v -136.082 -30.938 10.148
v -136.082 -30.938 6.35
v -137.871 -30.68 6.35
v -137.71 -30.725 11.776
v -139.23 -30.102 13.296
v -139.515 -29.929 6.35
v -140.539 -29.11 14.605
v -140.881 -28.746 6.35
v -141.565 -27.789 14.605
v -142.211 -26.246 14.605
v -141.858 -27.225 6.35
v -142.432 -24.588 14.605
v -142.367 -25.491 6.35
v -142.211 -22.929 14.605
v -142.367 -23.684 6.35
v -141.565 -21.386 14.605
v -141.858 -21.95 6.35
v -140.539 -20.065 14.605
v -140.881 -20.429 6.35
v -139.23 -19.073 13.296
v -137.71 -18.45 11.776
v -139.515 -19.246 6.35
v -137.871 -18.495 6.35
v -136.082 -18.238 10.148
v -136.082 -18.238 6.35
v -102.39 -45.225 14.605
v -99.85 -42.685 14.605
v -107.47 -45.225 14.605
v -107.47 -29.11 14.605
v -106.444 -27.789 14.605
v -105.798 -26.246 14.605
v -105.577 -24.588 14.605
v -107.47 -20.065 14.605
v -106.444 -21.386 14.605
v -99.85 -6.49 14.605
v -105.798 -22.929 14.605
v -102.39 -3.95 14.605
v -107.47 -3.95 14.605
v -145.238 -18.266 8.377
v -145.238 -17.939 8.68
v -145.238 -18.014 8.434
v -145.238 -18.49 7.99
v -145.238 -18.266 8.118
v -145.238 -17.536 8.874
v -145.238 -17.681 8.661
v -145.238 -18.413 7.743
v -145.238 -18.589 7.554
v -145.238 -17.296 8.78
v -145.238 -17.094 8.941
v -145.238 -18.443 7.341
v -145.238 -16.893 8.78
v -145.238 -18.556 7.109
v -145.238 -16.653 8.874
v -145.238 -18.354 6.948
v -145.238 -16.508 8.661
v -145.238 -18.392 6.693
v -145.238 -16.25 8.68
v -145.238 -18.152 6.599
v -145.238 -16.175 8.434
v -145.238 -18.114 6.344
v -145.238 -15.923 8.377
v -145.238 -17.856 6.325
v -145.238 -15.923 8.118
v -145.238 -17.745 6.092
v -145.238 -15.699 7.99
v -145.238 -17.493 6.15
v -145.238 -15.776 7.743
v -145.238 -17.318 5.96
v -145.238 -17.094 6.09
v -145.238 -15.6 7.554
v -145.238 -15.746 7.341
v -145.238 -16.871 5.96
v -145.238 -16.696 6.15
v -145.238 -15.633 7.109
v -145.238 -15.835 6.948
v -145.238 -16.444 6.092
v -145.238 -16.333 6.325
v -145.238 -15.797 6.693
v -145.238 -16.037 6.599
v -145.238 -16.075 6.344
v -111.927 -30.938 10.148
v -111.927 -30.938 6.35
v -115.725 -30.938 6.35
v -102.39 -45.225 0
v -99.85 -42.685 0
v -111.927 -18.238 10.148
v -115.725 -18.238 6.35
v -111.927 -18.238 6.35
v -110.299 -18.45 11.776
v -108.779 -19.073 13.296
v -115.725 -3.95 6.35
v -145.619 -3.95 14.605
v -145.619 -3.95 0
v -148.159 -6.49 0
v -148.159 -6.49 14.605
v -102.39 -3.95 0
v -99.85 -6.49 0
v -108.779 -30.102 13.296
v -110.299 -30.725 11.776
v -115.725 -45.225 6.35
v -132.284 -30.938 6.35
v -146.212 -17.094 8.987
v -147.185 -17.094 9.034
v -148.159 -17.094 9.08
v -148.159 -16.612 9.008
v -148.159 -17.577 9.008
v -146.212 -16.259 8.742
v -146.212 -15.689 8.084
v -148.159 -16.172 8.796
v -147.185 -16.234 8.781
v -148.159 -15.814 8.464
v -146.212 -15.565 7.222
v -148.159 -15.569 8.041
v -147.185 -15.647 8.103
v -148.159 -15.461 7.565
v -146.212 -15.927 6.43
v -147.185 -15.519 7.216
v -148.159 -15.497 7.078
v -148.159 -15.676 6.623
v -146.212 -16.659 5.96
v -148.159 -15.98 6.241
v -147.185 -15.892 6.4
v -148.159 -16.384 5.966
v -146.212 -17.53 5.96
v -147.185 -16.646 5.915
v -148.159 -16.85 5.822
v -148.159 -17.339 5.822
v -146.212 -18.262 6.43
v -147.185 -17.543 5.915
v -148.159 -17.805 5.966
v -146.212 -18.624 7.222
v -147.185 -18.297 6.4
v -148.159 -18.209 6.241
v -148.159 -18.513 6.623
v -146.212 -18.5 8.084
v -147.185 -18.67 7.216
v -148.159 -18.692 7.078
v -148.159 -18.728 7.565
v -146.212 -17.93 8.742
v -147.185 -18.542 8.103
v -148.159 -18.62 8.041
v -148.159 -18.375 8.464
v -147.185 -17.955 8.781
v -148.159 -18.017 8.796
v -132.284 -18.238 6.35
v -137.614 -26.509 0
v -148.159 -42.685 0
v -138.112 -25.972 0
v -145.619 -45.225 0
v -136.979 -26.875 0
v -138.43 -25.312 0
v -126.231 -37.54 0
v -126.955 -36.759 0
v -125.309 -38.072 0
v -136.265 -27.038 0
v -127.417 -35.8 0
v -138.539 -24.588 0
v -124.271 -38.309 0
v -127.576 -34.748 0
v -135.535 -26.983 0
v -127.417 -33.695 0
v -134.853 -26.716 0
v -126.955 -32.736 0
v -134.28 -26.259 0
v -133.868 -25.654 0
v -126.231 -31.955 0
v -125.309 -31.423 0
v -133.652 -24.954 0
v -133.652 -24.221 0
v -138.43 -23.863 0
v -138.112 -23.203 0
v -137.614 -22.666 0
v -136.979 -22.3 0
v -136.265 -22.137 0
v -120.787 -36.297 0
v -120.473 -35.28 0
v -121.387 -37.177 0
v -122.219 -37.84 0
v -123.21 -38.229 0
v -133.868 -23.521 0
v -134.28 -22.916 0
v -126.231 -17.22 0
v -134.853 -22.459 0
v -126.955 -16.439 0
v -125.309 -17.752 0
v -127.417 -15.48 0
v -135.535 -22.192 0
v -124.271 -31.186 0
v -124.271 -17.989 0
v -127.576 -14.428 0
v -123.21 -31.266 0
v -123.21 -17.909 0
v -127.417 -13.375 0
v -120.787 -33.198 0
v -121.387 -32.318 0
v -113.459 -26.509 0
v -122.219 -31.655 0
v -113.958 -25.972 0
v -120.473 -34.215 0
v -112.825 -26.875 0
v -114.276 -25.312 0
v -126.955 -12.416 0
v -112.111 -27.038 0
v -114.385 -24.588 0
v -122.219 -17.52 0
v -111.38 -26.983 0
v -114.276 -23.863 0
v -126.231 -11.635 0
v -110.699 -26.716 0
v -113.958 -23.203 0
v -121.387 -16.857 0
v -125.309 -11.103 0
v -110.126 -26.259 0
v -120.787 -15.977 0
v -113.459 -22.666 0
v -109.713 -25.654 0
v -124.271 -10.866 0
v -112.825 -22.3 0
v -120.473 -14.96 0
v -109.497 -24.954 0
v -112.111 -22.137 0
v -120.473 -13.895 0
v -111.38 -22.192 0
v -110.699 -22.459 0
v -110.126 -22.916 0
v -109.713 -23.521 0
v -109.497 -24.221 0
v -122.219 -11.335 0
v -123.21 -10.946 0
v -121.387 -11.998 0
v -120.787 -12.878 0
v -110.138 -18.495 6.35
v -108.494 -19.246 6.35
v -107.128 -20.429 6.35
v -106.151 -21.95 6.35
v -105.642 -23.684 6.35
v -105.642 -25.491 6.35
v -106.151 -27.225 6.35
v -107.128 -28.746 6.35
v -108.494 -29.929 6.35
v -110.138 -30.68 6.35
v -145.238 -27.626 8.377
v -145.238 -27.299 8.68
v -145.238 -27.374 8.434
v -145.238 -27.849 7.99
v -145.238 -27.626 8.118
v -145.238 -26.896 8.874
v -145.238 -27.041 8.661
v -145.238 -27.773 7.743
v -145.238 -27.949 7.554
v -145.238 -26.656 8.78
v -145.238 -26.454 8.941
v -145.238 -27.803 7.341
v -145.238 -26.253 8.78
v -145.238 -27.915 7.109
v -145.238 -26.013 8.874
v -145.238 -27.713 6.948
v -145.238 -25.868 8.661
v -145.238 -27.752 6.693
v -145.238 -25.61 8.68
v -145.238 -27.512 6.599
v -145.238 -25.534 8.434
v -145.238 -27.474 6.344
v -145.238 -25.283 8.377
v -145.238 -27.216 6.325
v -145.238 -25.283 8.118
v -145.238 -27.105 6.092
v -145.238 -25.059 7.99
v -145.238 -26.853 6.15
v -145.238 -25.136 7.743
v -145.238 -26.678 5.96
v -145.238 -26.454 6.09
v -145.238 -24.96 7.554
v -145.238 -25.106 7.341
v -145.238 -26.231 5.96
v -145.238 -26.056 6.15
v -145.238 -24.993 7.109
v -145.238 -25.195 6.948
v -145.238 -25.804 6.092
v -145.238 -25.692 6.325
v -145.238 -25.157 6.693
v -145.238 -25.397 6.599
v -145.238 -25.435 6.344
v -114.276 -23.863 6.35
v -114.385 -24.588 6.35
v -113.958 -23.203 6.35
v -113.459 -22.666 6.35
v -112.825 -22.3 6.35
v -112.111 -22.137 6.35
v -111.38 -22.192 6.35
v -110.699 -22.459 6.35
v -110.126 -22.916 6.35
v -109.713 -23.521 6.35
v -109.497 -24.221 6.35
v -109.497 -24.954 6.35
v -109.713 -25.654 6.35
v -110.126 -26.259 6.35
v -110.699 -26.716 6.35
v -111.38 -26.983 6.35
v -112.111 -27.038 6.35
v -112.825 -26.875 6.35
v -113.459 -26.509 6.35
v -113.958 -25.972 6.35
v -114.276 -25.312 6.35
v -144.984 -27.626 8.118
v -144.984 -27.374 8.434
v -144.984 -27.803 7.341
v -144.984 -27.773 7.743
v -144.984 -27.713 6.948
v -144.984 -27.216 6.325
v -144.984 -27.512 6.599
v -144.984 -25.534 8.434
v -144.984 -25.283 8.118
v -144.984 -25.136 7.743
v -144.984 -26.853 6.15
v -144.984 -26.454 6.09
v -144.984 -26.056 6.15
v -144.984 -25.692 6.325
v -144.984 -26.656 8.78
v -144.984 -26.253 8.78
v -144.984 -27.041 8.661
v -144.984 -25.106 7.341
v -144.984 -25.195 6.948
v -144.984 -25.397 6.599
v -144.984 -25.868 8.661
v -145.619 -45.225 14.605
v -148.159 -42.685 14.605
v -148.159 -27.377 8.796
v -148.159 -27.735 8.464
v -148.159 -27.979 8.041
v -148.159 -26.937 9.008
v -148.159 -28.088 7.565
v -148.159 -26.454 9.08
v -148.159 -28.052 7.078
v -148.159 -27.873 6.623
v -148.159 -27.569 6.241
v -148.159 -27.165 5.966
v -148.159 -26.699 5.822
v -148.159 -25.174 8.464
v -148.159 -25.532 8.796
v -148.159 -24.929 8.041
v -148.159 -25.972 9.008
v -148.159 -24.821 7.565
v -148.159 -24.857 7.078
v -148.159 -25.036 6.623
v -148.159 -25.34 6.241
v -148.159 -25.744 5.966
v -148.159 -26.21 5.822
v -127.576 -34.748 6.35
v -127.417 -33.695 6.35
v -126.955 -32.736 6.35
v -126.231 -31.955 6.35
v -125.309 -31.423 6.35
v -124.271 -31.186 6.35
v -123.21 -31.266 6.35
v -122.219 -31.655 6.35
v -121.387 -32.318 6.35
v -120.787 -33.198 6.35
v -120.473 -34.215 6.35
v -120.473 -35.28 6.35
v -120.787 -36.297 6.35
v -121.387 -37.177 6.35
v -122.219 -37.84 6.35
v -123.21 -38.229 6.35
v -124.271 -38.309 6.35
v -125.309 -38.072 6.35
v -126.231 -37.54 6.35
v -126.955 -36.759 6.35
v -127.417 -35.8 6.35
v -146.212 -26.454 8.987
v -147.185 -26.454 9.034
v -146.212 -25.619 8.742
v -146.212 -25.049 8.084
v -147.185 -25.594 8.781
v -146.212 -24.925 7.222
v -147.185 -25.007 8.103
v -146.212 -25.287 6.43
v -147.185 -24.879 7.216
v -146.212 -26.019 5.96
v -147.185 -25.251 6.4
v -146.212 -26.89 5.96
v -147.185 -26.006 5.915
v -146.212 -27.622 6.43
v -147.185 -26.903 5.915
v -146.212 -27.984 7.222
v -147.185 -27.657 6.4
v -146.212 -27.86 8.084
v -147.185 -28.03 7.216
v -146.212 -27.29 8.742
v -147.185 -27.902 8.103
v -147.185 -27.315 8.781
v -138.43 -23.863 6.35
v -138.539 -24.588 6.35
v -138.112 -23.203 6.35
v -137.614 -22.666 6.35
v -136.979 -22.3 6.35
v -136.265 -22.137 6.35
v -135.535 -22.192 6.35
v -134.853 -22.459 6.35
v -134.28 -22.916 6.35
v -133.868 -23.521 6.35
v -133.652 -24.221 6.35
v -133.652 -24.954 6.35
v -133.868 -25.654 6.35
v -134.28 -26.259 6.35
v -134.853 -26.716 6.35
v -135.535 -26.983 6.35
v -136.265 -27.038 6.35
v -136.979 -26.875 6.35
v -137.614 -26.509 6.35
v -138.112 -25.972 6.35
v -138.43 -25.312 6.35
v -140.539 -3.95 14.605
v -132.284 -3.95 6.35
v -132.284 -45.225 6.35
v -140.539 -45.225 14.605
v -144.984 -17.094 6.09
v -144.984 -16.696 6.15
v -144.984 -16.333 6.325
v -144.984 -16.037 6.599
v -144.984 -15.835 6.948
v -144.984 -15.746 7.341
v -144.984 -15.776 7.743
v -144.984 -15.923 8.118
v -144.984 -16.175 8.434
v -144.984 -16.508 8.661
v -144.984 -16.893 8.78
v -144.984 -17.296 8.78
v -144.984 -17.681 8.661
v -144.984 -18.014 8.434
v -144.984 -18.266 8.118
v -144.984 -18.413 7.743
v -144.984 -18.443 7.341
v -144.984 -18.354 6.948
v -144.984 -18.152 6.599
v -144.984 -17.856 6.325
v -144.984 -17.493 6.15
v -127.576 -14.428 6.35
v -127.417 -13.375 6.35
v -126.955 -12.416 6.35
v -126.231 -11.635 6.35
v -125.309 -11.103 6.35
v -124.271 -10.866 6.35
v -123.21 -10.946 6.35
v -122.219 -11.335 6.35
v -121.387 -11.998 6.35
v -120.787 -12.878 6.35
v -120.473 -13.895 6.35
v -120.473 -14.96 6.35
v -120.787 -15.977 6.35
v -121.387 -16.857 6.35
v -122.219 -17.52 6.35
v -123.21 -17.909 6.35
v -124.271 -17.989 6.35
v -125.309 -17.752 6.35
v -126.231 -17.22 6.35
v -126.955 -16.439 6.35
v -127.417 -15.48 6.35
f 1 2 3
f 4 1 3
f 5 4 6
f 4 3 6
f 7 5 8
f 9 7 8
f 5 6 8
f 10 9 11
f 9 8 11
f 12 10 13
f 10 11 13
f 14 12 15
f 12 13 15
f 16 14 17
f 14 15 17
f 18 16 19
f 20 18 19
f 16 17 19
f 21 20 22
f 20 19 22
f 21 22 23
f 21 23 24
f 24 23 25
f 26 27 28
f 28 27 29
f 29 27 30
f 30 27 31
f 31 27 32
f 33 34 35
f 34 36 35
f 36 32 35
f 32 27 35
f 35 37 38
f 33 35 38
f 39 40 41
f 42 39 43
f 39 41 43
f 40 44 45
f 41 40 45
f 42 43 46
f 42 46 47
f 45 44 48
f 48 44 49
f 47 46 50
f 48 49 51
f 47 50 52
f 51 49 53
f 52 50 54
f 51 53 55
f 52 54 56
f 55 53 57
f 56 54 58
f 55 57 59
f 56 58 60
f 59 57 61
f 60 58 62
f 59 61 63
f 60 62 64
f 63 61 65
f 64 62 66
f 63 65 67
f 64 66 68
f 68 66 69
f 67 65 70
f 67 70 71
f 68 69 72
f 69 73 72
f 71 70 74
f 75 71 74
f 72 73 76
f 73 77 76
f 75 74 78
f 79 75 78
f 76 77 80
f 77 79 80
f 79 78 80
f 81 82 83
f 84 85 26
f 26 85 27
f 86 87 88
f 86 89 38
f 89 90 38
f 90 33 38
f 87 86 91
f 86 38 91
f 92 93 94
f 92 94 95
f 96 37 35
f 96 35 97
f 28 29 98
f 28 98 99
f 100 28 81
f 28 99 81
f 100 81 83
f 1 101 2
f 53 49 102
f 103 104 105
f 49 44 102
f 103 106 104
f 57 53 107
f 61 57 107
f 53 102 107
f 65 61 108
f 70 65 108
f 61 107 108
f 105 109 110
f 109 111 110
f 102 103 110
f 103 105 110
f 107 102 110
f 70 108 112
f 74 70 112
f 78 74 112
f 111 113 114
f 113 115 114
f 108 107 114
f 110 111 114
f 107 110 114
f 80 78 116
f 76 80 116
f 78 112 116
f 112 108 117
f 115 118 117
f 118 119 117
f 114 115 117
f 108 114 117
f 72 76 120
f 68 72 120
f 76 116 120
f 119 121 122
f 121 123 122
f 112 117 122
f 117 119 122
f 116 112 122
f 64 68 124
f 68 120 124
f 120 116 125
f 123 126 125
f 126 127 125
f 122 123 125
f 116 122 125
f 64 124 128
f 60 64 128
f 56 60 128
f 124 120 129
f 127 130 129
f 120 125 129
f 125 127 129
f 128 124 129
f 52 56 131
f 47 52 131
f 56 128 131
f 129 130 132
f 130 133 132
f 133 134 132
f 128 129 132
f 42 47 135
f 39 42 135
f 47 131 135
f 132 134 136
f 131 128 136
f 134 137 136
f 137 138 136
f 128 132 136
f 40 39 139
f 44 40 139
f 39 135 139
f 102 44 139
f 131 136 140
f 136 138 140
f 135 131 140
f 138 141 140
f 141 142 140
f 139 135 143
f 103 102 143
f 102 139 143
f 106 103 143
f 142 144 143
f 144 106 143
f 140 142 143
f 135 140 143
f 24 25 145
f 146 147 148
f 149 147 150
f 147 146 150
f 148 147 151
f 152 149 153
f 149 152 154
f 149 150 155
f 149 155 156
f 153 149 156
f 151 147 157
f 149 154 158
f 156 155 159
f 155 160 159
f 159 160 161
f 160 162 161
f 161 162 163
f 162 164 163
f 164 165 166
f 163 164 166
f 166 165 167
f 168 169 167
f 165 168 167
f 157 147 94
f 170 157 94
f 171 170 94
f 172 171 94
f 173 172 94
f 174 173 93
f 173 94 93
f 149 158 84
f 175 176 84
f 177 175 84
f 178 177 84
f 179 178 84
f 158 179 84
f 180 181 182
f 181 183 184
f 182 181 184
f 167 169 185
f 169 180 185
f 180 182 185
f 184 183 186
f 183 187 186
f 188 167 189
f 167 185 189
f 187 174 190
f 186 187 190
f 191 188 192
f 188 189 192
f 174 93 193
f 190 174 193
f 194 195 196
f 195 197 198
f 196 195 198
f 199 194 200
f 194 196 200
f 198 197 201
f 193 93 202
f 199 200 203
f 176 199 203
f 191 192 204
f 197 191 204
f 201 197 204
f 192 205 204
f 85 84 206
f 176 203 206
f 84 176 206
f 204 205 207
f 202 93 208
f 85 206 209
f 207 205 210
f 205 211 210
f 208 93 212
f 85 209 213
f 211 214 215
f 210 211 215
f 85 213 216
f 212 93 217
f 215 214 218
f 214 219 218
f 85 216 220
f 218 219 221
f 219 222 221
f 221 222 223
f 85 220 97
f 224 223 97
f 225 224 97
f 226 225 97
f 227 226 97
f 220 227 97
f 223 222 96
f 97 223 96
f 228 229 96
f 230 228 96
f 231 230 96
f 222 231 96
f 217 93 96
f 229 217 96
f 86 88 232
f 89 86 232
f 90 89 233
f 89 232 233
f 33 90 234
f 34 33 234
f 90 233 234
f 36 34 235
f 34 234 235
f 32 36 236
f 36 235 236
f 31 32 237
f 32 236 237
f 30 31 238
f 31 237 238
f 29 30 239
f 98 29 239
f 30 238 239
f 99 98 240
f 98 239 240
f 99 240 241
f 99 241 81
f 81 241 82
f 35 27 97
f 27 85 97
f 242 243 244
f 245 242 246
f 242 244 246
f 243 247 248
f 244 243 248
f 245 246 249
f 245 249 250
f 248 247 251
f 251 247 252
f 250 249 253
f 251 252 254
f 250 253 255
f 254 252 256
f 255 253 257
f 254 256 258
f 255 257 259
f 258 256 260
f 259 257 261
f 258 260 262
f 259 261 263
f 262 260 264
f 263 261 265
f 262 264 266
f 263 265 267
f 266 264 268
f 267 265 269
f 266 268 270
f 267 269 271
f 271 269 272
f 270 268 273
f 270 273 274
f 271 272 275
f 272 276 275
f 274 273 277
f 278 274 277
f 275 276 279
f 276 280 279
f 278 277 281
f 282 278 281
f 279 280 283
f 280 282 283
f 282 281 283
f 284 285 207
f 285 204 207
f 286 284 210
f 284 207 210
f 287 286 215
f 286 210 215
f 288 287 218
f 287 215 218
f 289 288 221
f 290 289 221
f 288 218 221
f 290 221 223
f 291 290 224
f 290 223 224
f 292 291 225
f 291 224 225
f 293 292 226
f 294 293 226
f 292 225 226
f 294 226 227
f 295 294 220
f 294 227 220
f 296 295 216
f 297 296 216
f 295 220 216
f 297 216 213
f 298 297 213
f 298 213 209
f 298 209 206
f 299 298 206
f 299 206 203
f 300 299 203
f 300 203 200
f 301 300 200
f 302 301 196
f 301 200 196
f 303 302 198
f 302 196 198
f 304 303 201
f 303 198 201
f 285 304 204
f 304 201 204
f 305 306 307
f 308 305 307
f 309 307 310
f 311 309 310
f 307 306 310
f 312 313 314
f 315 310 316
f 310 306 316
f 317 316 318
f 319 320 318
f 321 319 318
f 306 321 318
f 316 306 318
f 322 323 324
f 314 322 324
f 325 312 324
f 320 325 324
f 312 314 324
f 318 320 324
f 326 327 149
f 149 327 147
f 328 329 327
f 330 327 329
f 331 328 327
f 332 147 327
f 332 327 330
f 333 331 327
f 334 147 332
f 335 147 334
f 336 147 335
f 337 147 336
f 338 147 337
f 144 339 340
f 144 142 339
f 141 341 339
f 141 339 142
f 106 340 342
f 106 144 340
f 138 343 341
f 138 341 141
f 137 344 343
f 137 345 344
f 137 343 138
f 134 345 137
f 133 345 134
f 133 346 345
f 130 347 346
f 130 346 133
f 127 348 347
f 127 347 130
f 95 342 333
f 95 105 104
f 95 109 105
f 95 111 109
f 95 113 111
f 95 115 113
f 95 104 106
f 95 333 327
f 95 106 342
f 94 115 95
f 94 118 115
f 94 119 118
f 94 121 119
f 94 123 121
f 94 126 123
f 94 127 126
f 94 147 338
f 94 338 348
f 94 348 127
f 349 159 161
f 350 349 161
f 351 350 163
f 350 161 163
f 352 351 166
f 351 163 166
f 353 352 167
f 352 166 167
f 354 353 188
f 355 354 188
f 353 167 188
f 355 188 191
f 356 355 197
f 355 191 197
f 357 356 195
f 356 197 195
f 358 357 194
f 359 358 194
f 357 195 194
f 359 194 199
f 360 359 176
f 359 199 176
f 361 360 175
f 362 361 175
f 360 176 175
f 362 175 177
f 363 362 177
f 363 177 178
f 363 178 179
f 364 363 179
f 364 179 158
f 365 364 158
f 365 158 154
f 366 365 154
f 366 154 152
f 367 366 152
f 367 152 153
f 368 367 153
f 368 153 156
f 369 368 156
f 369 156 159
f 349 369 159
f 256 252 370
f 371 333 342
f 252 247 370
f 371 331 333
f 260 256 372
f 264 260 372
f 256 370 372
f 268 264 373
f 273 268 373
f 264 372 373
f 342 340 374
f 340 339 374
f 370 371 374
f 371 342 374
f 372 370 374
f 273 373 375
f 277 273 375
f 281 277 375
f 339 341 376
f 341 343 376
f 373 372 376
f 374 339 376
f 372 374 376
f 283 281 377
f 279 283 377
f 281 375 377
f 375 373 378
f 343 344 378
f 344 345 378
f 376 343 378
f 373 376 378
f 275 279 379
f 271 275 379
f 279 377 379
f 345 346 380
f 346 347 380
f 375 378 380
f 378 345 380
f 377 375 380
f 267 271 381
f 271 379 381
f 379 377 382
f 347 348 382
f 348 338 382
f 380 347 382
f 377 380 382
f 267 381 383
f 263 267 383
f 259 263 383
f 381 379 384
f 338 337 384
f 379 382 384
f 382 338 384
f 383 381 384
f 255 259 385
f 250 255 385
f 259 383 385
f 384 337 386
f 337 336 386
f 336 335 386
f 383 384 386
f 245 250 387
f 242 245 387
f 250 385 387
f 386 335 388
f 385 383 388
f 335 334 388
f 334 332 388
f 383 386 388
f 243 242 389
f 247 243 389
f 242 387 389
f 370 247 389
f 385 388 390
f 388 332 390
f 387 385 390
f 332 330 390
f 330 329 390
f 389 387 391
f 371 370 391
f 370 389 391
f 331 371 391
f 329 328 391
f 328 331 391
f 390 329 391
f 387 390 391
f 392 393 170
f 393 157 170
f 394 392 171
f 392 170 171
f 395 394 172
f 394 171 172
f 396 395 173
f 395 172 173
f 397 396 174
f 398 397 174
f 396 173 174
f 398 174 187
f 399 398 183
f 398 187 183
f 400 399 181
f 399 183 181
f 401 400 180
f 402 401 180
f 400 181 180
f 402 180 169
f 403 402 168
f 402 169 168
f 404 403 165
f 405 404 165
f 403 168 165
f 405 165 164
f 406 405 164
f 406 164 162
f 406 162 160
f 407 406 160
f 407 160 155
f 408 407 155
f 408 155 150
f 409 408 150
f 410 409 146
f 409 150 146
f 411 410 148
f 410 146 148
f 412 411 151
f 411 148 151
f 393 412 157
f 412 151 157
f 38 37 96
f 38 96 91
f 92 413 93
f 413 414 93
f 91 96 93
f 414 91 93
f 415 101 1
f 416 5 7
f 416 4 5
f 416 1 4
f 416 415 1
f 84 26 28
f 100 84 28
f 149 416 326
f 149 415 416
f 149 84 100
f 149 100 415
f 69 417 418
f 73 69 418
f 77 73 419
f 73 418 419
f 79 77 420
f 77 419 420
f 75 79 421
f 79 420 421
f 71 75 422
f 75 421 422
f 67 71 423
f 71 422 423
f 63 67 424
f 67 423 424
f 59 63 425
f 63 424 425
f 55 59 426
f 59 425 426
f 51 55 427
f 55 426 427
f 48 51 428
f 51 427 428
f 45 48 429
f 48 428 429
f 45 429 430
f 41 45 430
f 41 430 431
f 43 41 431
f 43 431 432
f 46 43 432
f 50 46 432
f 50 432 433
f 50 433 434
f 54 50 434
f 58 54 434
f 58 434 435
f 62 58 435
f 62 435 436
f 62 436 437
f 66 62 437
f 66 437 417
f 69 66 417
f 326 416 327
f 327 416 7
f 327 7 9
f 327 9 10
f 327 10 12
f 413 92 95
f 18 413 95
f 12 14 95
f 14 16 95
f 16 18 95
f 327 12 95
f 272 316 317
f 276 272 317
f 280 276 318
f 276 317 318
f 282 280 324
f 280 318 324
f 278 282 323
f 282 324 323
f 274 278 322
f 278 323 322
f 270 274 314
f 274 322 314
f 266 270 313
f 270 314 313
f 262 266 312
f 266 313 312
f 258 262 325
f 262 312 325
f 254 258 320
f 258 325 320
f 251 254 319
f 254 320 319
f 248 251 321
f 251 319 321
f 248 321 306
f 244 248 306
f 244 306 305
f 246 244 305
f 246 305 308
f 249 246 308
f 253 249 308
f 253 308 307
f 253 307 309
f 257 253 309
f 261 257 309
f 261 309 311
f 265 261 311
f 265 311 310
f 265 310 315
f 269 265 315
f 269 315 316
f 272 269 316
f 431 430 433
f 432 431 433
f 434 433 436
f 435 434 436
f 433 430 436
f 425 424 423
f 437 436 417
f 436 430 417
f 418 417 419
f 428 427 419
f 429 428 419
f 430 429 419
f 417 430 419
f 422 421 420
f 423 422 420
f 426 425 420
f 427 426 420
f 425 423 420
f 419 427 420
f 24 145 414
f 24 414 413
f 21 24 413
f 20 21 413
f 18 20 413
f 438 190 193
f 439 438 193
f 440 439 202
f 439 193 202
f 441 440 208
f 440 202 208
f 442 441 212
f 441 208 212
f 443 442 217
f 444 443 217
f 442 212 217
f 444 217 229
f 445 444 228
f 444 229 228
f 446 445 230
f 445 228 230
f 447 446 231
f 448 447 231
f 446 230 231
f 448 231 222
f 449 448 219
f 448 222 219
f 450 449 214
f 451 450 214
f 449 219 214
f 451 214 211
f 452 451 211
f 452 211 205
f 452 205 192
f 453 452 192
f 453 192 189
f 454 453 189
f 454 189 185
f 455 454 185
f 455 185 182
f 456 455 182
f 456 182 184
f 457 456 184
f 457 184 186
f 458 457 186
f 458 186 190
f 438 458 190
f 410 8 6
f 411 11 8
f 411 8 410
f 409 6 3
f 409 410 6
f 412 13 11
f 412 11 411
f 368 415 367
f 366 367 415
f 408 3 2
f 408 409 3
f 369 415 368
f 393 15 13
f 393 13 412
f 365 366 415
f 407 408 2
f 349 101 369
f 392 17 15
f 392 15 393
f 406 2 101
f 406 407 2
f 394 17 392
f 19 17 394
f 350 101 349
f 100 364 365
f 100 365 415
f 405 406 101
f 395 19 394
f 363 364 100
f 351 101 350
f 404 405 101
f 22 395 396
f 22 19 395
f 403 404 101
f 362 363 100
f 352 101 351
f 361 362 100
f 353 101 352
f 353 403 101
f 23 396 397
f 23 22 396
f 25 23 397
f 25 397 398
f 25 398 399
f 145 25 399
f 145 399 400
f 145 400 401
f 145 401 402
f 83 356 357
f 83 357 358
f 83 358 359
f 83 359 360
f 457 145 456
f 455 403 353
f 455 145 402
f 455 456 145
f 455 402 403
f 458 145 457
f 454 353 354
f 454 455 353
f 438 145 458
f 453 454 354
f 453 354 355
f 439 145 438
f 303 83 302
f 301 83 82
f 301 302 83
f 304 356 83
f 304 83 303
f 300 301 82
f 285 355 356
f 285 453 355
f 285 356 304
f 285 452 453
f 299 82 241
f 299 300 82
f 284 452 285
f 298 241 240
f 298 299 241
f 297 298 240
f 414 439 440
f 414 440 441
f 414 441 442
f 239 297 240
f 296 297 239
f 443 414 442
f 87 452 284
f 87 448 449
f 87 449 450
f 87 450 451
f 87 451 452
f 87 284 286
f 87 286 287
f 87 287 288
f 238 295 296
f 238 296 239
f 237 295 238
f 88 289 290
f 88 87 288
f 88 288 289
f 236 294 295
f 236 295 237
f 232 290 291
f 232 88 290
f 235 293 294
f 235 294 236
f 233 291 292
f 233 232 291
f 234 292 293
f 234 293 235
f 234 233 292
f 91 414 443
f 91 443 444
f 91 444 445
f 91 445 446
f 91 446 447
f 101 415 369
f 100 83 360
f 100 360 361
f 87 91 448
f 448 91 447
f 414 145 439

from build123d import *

# Parameters (mm, degrees)
SKETCH1_W                 = 48.308864232
SKETCH1_H                 = 41.275
BOSS_EXTRUDE1_DEPTH       = 6.35
F_8_CLEARANCE_HOLE1_D     = 4.9149
F_1_4_CLEARANCE_HOLE1_D   = 7.14248
SKETCH9_W                 = 6.35
SKETCH9_H                 = 41.275
EXTRUDE_THIN1_DEPTH       = 8.255
CHAMFER2_SIZE             = 9.525
CUT_EXTRUDE1_DEPTH        = 156.127382276
CHAMFER1_SIZE             = 2.54
HOLE1_AT_2_COUNT          = 2
HOLE1_AT_2_PITCH          = 9.3599
F_2_CLEARANCE_HOLE1_D     = 2.7051
F_2_CLEARANCE_HOLE1_DEPTH = 3.175


with BuildPart() as part:
    # Sketch1 → Boss-Extrude1 (new body)
    with BuildSketch(Plane.XY):
        with Locations((-124.004465969, -24.5875)):
            Rectangle(SKETCH1_W, SKETCH1_H)
    extrude(amount=BOSS_EXTRUDE1_DEPTH)

    # #8 Clearance Hole1 (through all)
    with Locations(Plane.XY.offset(6.35)):
        with Locations((-111.927249911, -24.5875), (-136.081682027, -24.5875)):
            Hole(F_8_CLEARANCE_HOLE1_D / 2)

    # 1/4 Clearance Hole1 (through all)
    with Locations(Plane.XY.offset(6.35)):
        with Locations((-124.004465969, -14.4275), (-124.004465969, -34.7475)):
            Hole(F_1_4_CLEARANCE_HOLE1_D / 2)

    # Sketch9 → Extrude-Thin1 (add)
    with BuildSketch(Plane.XY.offset(6.35)):
        with Locations((-103.025033853, -24.5875)):
            Rectangle(SKETCH9_W, SKETCH9_H)
        with Locations((-144.983898085, -24.5875)):
            Rectangle(SKETCH9_W, SKETCH9_H)
    extrude(amount=EXTRUDE_THIN1_DEPTH)

    # Chamfer2
    # the kernel refuses this chamfer: 9.525 mm, written as the material it adds along each edge
    with BuildSketch(Plane(origin=(-106.200033853, -3.95, 6.35), x_dir=(0.0274958766105871, 0, 0.9996219169112966), z_dir=(0, -1, 0))) as chamfer2_piece_1_section:
        Polygon((CHAMFER2_SIZE * 0.999621916911, CHAMFER2_SIZE * 0.0274958766106), (-CHAMFER2_SIZE * 0.0274958766106, CHAMFER2_SIZE * 0.999621916911), (0, 0), align=None)
    chamfer2_piece_1 = extrude(amount=41.275, mode=Mode.PRIVATE)
    chamfer2_piece_1 = chamfer2_piece_1 - Plane(origin=(-111.927249911, -24.5875, 9.368765613), x_dir=(-1, 0, 0), z_dir=(0, 0, -1)) * Cylinder(2.45745, 121, mode=Mode.PRIVATE)
    chamfer2_piece_1 = split(chamfer2_piece_1, bisect_by=Plane(origin=(-109.341812124, -24.58749874, 14.605), z_dir=(0, 0, -1)), keep=Keep.TOP, mode=Mode.PRIVATE)
    add(chamfer2_piece_1)
    with BuildSketch(Plane(origin=(-141.808898085, -45.225, 6.35), x_dir=(0.9996219169112968, 0, -0.027495876610586386), z_dir=(0, 1, 0))) as chamfer2_piece_2_section:
        Polygon((CHAMFER2_SIZE * 0.999621916911, -CHAMFER2_SIZE * 0.0274958766106), (-CHAMFER2_SIZE * 0.0274958766106, -CHAMFER2_SIZE * 0.999621916911), (0, 0), align=None)
    chamfer2_piece_2 = extrude(amount=41.275, mode=Mode.PRIVATE)
    chamfer2_piece_2 = chamfer2_piece_2 - Plane(origin=(-136.081682027, -24.5875, 9.368765819), x_dir=(-1, 0, 0), z_dir=(0, 0, -1)) * Cylinder(2.45745, 121, mode=Mode.PRIVATE)
    chamfer2_piece_2 = split(chamfer2_piece_2, bisect_by=Plane(origin=(-138.667118685, -24.587501904, 14.605), z_dir=(0, 0, -1)), keep=Keep.TOP, mode=Mode.PRIVATE)
    add(chamfer2_piece_2)

    # Sketch10 → Cut-Extrude1 (cut, through all)
    with BuildSketch(Plane.XY.offset(6.35)):
        with BuildLine():
            Line((-136.081682027, -18.2375), (-111.927249911, -18.2375))
            ThreePointArc((-111.927249911, -18.2375), (-105.577249911, -24.5875), (-111.927249911, -30.9375))
            Line((-111.927249911, -30.9375), (-136.081682027, -30.9375))
            ThreePointArc((-136.081682027, -30.9375), (-142.431682027, -24.5875), (-136.081682027, -18.2375))
        make_face()
    extrude(amount=CUT_EXTRUDE1_DEPTH, mode=Mode.SUBTRACT)

    # Chamfer1
    chamfer1_edges = [part.edges().sort_by_distance(p)[0] for p in [
        (-99.850033853, -45.225, 7.3025),
        (-148.158898085, -45.225, 7.3025),
        (-148.158898085, -3.95, 7.3025),
        (-99.850033853, -3.95, 7.3025),
    ]]
    chamfer(chamfer1_edges, length=CHAMFER1_SIZE)

    # Sketch12 → Hole1 (revolve, cut)
    with BuildSketch(Plane(origin=(-148.158898085, -26.4544, 7.4422), x_dir=(0, 0, 1), z_dir=(0, 1, 0))):
        Polygon((0, 0), (0, 2.921), (1.4986, 2.921), (1.6383, 0), align=None)
    hole1 = revolve(axis=Axis((-38.158898085, -26.4544, 7.4422), (-1, 0, 0)), mode=Mode.SUBTRACT)

    # Hole1 at 2: Hole1 ×2
    with Locations(*[(0, i * HOLE1_AT_2_PITCH, 0) for i in range(1, HOLE1_AT_2_COUNT)]):
        add(hole1, mode=Mode.SUBTRACT)

    # #2 Clearance Hole1
    with Locations(Plane.ZY.offset(148.158898085)):
        with Locations((7.4422, -17.0945), (7.4422, -26.4544)):
            Hole(F_2_CLEARANCE_HOLE1_D / 2, depth=F_2_CLEARANCE_HOLE1_DEPTH)


solid = part.part
